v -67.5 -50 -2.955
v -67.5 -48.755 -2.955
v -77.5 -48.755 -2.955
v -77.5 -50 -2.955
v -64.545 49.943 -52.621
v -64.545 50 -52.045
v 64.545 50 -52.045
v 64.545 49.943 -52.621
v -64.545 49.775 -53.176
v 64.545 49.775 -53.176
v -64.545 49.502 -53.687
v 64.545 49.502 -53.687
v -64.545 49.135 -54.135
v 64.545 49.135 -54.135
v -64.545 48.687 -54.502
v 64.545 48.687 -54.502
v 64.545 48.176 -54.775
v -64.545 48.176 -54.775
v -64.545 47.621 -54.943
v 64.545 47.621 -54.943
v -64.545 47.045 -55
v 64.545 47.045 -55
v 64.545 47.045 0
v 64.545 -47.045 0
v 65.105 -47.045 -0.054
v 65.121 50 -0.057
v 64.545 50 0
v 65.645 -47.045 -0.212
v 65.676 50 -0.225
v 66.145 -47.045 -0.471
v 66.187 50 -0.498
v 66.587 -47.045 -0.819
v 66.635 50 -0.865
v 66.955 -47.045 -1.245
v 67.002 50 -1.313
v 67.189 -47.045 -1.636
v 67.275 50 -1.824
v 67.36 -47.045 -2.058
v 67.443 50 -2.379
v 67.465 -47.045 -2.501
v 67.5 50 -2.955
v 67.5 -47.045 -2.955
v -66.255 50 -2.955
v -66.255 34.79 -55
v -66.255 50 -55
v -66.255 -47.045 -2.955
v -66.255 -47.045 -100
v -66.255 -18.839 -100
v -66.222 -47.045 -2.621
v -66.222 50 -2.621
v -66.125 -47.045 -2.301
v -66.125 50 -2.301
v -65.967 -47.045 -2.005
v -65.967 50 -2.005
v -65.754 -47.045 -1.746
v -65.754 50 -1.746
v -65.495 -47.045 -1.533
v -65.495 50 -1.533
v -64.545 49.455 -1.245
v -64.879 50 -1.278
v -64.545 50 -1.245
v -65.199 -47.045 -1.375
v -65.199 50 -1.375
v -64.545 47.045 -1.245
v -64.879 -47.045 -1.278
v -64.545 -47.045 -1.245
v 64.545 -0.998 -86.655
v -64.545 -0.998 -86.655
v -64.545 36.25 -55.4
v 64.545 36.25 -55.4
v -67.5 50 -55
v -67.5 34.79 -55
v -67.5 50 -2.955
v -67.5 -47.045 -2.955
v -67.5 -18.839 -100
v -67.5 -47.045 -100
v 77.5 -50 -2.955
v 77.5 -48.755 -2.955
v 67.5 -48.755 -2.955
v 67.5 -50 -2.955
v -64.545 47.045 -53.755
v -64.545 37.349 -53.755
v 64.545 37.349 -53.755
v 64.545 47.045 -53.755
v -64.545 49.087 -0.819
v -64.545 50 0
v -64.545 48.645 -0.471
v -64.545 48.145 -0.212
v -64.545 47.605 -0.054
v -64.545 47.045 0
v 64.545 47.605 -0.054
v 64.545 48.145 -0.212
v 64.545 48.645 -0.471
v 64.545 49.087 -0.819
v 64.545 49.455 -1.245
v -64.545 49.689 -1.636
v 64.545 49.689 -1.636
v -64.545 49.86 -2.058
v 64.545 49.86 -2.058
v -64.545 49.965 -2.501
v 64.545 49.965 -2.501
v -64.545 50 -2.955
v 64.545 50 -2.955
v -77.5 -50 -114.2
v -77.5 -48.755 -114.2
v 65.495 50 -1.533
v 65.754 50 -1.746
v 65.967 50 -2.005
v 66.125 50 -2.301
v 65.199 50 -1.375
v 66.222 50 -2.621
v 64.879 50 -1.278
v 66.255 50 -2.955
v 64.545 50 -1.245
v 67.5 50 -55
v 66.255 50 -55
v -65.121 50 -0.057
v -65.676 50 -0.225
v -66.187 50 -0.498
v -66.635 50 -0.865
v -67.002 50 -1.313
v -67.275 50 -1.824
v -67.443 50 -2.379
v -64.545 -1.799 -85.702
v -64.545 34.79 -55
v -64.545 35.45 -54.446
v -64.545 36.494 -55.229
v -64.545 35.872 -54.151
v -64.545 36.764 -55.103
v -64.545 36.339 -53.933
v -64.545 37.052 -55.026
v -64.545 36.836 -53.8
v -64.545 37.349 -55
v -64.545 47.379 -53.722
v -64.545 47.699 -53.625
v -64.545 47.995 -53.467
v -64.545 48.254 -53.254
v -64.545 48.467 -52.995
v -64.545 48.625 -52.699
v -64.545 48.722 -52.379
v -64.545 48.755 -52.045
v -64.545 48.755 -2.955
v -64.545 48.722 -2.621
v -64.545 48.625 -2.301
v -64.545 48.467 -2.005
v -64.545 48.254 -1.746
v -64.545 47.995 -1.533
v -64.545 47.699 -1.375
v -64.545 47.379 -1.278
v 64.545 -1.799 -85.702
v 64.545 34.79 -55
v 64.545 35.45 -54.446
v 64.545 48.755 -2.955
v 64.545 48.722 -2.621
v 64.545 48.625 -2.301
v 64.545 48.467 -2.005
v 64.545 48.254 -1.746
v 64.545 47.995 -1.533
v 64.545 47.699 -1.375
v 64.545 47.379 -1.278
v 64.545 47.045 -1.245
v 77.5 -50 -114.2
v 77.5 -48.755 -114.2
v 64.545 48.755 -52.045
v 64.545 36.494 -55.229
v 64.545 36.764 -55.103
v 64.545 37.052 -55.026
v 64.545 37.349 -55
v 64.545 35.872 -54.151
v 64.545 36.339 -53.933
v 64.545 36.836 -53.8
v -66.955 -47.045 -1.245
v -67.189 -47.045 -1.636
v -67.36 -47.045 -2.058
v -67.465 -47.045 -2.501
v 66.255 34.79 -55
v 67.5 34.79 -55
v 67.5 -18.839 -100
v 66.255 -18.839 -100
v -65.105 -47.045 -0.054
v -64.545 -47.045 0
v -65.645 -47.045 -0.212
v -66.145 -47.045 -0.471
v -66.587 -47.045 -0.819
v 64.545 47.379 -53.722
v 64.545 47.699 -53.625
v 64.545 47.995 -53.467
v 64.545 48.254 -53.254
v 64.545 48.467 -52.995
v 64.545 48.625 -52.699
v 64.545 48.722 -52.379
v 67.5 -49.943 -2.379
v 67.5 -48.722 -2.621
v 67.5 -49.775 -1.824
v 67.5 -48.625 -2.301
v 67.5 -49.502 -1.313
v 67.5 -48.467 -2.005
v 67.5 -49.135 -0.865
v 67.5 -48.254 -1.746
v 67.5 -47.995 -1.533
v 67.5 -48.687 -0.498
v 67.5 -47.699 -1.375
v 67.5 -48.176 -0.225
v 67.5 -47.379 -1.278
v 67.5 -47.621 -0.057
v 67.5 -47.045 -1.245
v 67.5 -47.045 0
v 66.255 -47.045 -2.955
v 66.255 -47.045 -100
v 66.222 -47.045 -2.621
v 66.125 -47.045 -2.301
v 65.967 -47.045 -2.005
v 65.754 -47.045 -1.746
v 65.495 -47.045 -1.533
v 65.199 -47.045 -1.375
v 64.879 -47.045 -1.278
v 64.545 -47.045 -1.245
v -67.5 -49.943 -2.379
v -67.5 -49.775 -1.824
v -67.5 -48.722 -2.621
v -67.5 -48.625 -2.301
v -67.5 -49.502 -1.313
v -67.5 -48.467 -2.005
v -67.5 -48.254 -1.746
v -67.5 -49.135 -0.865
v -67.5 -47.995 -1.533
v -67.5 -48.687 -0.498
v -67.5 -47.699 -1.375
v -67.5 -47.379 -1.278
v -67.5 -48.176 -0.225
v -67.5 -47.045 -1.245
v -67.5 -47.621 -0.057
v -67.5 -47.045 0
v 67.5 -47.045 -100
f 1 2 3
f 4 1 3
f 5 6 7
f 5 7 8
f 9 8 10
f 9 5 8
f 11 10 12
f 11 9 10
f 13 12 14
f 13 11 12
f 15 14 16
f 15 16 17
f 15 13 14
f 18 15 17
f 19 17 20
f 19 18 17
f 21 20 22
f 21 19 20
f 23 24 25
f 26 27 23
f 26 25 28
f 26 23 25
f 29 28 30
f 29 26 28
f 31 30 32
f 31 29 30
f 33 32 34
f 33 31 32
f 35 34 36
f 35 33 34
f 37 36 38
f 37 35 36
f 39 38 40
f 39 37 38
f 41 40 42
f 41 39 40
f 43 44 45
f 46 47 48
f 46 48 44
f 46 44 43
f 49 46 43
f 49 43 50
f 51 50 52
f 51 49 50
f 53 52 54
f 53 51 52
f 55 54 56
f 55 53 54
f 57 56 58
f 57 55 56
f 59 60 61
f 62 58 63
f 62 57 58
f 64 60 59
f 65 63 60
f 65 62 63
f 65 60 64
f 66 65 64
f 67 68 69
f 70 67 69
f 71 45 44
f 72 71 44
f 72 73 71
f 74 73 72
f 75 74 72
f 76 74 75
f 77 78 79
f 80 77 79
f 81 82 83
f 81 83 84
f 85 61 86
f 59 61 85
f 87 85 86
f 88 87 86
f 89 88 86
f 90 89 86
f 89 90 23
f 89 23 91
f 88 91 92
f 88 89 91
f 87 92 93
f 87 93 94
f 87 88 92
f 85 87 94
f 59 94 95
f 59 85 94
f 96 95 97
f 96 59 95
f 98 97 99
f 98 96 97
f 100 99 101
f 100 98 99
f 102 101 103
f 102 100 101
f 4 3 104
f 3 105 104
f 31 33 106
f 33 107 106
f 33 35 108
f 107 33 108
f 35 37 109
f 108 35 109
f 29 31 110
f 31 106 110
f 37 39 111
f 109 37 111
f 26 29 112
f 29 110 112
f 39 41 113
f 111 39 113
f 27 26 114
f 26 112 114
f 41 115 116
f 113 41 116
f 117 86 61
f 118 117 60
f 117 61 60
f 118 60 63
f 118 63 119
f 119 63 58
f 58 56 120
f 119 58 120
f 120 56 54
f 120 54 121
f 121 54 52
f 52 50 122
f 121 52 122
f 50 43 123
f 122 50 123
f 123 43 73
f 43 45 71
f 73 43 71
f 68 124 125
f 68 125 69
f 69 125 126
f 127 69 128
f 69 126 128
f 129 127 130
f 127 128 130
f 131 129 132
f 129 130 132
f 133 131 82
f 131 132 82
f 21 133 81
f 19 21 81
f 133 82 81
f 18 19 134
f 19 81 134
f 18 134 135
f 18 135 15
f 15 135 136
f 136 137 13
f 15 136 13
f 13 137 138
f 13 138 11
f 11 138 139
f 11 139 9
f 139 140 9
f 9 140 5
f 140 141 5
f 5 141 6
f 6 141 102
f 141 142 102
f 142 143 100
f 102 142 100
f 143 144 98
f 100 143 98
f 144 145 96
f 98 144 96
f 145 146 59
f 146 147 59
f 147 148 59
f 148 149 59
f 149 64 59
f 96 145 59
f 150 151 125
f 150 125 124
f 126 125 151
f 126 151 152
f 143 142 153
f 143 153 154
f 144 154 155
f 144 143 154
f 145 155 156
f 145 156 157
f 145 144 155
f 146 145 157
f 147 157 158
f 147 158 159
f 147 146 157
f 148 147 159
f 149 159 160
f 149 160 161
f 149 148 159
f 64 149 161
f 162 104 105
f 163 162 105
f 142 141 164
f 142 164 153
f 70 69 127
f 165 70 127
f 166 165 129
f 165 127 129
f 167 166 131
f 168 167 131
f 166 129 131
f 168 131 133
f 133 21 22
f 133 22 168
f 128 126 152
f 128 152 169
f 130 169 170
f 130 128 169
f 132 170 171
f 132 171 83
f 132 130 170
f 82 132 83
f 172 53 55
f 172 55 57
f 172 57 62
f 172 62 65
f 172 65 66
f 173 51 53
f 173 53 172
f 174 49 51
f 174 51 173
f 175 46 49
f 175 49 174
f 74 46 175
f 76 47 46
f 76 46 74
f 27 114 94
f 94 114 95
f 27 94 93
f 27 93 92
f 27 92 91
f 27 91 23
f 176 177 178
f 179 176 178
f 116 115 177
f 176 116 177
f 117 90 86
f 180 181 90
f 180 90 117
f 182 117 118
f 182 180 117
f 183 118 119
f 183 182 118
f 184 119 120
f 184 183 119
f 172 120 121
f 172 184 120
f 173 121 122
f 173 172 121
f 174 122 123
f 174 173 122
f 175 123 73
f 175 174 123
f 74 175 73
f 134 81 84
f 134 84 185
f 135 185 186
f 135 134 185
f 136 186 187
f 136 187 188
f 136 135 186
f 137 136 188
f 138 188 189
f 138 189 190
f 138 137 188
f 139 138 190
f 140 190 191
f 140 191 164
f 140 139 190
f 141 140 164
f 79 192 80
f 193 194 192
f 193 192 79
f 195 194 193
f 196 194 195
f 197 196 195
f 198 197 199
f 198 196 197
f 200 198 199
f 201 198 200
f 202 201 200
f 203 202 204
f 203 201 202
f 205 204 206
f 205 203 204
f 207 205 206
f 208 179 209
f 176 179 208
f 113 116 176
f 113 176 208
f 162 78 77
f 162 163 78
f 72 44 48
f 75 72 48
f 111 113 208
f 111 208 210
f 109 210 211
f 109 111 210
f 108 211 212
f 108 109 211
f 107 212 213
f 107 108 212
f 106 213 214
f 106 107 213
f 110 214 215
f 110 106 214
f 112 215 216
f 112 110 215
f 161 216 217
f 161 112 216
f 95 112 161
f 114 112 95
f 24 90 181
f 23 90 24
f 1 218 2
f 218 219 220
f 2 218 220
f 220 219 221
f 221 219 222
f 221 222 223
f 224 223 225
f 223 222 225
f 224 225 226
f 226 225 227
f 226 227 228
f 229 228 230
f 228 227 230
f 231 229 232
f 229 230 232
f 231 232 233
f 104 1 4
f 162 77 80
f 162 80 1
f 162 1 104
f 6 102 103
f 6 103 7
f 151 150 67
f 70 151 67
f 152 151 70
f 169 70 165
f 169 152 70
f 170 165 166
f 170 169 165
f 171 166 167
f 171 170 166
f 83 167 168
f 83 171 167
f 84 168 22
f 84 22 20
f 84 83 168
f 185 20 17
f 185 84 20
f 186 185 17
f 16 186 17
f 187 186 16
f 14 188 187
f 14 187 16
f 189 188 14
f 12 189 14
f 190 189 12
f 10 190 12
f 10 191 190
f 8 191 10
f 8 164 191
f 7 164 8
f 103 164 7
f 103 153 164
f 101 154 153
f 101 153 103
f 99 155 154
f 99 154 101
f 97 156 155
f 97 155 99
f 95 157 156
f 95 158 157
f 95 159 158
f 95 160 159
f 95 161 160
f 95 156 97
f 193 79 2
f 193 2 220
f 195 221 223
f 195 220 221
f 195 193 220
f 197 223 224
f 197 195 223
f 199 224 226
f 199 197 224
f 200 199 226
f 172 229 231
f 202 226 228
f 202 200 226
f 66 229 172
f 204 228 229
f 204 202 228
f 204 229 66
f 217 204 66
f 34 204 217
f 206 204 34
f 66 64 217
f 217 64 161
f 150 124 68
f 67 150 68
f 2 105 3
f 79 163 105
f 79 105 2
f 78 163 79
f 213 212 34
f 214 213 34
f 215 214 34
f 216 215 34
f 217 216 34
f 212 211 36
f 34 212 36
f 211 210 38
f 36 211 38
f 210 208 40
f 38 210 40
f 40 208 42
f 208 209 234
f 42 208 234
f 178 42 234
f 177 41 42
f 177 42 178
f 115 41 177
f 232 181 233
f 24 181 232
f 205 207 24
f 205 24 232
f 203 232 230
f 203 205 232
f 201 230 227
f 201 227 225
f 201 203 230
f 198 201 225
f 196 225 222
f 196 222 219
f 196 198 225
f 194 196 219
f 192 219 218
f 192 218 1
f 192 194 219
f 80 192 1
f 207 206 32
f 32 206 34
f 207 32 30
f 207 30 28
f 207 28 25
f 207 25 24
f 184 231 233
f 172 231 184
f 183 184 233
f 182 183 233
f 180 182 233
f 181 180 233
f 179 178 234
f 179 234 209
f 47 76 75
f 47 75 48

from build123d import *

# Parameters (mm, degrees)
SKETCH1_W                      = 155
SKETCH1_H                      = 100
BASE_FLANGE2_DEPTH             = 1.245
EDGE_FLANGE3_STRIP_W           = 8.4
EDGE_FLANGE3_STRIP_H           = 1.245
EDGE_FLANGE3_STRIP_CUT_DEPTH   = 155
EDGE_FLANGE3_DEPTH             = 155
CUT_EXTRUDE2_START             = -1.245
CUT_EXTRUDE2_OUTLINE_W         = 10
CUT_EXTRUDE2_OUTLINE_H         = 102
CUT_EXTRUDE2_DEPTH             = 2.955
EDGE_FLANGE4_STRIP_W           = 8.4
EDGE_FLANGE4_STRIP_H           = 1.245
EDGE_FLANGE4_STRIP_CUT_DEPTH   = 97.045
EDGE_FLANGE4_STRIP_2_W         = 8.4
EDGE_FLANGE4_STRIP_2_H         = 1.245
EDGE_FLANGE4_STRIP_CUT_2_DEPTH = 97.045
EDGE_FLANGE4_DEPTH             = 97.045
EDGE_FLANGE4_BEND_DEPTH        = 97.045
EDGE_FLANGE5_STRIP_W           = 8.4
EDGE_FLANGE5_STRIP_H           = 1.245
EDGE_FLANGE5_STRIP_CUT_DEPTH   = 129.09
EDGE_FLANGE5_DEPTH             = 129.09
CUT_EXTRUDE3_DEPTH             = 192.224057064
EDGE_FLANGE6_STRIP_W           = 8.4
EDGE_FLANGE6_STRIP_H           = 1.245
EDGE_FLANGE6_STRIP_CUT_DEPTH   = 129.09
EDGE_FLANGE6_DEPTH             = 129.09
EDGE_FLANGE7_START             = -64.545
EDGE_FLANGE7_DEPTH             = 129.09
EDGE_FLANGE7_2_DEPTH           = 129.09


# Read off the part's stored shape, not the designer's step: Cut-Extrude2, Edge-Flange7
# Sheet-metal steps are written as plain solids
with BuildPart() as part:
    # Sketch1 → Base-Flange2 (new body)
    with BuildSketch(Plane.XY):
        Rectangle(SKETCH1_W, SKETCH1_H)
    extrude(amount=-BASE_FLANGE2_DEPTH)

    # Edge-Flange3 strip (across the edge) → Edge-Flange3 strip cut (cut)
    with BuildSketch(Plane(origin=(77.5, -50, -1.245), x_dir=(0, 1, 0), z_dir=(-1, 0, 0))):
        with Locations((-1.245, -0.6225)):
            Rectangle(EDGE_FLANGE3_STRIP_W, EDGE_FLANGE3_STRIP_H)
    extrude(amount=EDGE_FLANGE3_STRIP_CUT_DEPTH, mode=Mode.SUBTRACT)

    # Edge-Flange3 section (across the edge) → Edge-Flange3 (add)
    with BuildSketch(Plane(origin=(77.5, -50, -1.245), x_dir=(0, 1, 0), z_dir=(-1, 0, 0))):
        with BuildLine():
            Line((0, 1.71), (0, 112.955))
            Line((0, 112.955), (1.245, 112.955))
            Line((1.245, 112.955), (1.245, 1.71))
            ThreePointArc((1.245, 1.71), (1.745847404, 0.500847404), (2.955, 0))
            Line((2.955, 0), (2.955, -1.245))
            ThreePointArc((2.955, -1.245), (0.865499462, -0.379500538), (0, 1.71))
        make_face()
    extrude(amount=EDGE_FLANGE3_DEPTH)

    # Cut-Extrude2 outline → Cut-Extrude2 (cut)
    with BuildSketch(Plane(origin=(0, 0, -1.245), x_dir=(-1, 0, 0), z_dir=(0, 0, -1)).offset(CUT_EXTRUDE2_START)):
        with Locations((72.5, 0)):
            Rectangle(CUT_EXTRUDE2_OUTLINE_W, CUT_EXTRUDE2_OUTLINE_H)
        with Locations((-72.5, 0)):
            Rectangle(CUT_EXTRUDE2_OUTLINE_W, CUT_EXTRUDE2_OUTLINE_H)
    extrude(amount=CUT_EXTRUDE2_DEPTH, mode=Mode.SUBTRACT)

    # Edge-Flange4 strip (across the edge) → Edge-Flange4 strip cut (cut)
    with BuildSketch(Plane(origin=(67.5, 50, -1.245), x_dir=(-1, 0, 0), z_dir=(0, -1, 0))):
        with Locations((-1.245, -0.6225)):
            Rectangle(EDGE_FLANGE4_STRIP_W, EDGE_FLANGE4_STRIP_H)
    extrude(amount=EDGE_FLANGE4_STRIP_CUT_DEPTH, mode=Mode.SUBTRACT)

    # Edge-Flange4 strip 2 (across the edge) → Edge-Flange4 strip cut 2 (cut)
    with BuildSketch(Plane(origin=(-67.5, -47.045, -1.245), x_dir=(1, 0, 0), z_dir=(0, 1, 0))):
        with Locations((-1.245, -0.6225)):
            Rectangle(EDGE_FLANGE4_STRIP_2_W, EDGE_FLANGE4_STRIP_2_H)
    extrude(amount=EDGE_FLANGE4_STRIP_CUT_2_DEPTH, mode=Mode.SUBTRACT)

    # Edge-Flange4 section (across the edge) → Edge-Flange4 (add)
    with BuildSketch(Plane(origin=(67.5, 50, -1.245), x_dir=(-1, 0, 0), z_dir=(0, -1, 0))):
        with BuildLine():
            Line((0, 1.71), (0, 98.755))
            Line((0, 98.755), (1.245, 98.755))
            Line((1.245, 98.755), (1.245, 1.71))
            ThreePointArc((1.245, 1.71), (1.745847404, 0.500847404), (2.955, 0))
            Line((2.955, 0), (2.955, -1.245))
            ThreePointArc((2.955, -1.245), (0.865499462, -0.379500538), (0, 1.71))
        make_face()
    extrude(amount=EDGE_FLANGE4_DEPTH)

    # Edge-Flange4 section 2 (across the edge) → Edge-Flange4 bend (add)
    with BuildSketch(Plane(origin=(-67.5, -47.045, -1.245), x_dir=(1, 0, 0), z_dir=(0, 1, 0))):
        with BuildLine():
            Line((0, 1.71), (0, 98.755))
            Line((0, 98.755), (1.245, 98.755))
            Line((1.245, 98.755), (1.245, 1.71))
            ThreePointArc((1.245, 1.71), (1.745847404, 0.500847404), (2.955, 0))
            Line((2.955, 0), (2.955, -1.245))
            ThreePointArc((2.955, -1.245), (0.865499462, -0.379500538), (0, 1.71))
        make_face()
    extrude(amount=EDGE_FLANGE4_BEND_DEPTH)

    # Edge-Flange5 strip (across the edge) → Edge-Flange5 strip cut (cut)
    with BuildSketch(Plane(origin=(-64.545, 50, -1.245), x_dir=(0, -1, 0), z_dir=(1, 0, 0))):
        with Locations((-1.245, -0.6225)):
            Rectangle(EDGE_FLANGE5_STRIP_W, EDGE_FLANGE5_STRIP_H)
    extrude(amount=EDGE_FLANGE5_STRIP_CUT_DEPTH, mode=Mode.SUBTRACT)

    # Edge-Flange5 section (across the edge) → Edge-Flange5 (add)
    with BuildSketch(Plane(origin=(-64.545, 50, -1.245), x_dir=(0, -1, 0), z_dir=(1, 0, 0))):
        with BuildLine():
            Line((0, 1.71), (0, 53.755))
            Line((0, 53.755), (1.245, 53.755))
            Line((1.245, 53.755), (1.245, 1.71))
            ThreePointArc((1.245, 1.71), (1.745847404, 0.500847404), (2.955, 0))
            Line((2.955, 0), (2.955, -1.245))
            ThreePointArc((2.955, -1.245), (0.865499462, -0.379500538), (0, 1.71))
        make_face()
    extrude(amount=EDGE_FLANGE5_DEPTH)

    # Sketch26 → Cut-Extrude3 (cut, through all)
    with BuildSketch(Plane(origin=(67.5, 0, 0), x_dir=(0, 0, -1), z_dir=(1, 0, 0))):
        Polygon((55, 50), (55, 34.789940387), (100, -18.83897128), (100, 50), align=None)
    extrude(amount=-CUT_EXTRUDE3_DEPTH, mode=Mode.SUBTRACT)

    # Edge-Flange6 strip (across the edge) → Edge-Flange6 strip cut (cut)
    with BuildSketch(Plane(origin=(-64.545, 48.755, -55), x_dir=(0, 0, 1), z_dir=(1, 0, 0))):
        with Locations((-1.245, -0.6225)):
            Rectangle(EDGE_FLANGE6_STRIP_W, EDGE_FLANGE6_STRIP_H)
    extrude(amount=EDGE_FLANGE6_STRIP_CUT_DEPTH, mode=Mode.SUBTRACT)

    # Edge-Flange6 section (across the edge) → Edge-Flange6 (add)
    with BuildSketch(Plane(origin=(-64.545, 48.755, -55), x_dir=(0, 0, 1), z_dir=(1, 0, 0))):
        with BuildLine():
            Line((0, 1.71), (0, 13.965059613))
            Line((0, 13.965059613), (1.245, 13.965059613))
            Line((1.245, 13.965059613), (1.245, 1.71))
            ThreePointArc((1.245, 1.71), (1.745847404, 0.500847404), (2.955, 0))
            Line((2.955, 0), (2.955, -1.245))
            ThreePointArc((2.955, -1.245), (0.865499462, -0.379500538), (0, 1.71))
        make_face()
    extrude(amount=EDGE_FLANGE6_DEPTH)

    # Edge-Flange7 outline → Edge-Flange7 (cut)
    with BuildSketch(Plane.YZ.offset(EDGE_FLANGE7_START)):
        with BuildLine():
            Line((34.789940387, -55), (35.449768265, -54.446338671))
            ThreePointArc((35.449768265, -54.446338671), (36.338536128, -53.933208306), (37.349205652, -53.755))
            Line((37.349205652, -53.755), (34.789940387, -53.755))
            Line((34.789940387, -53.755), (34.789940387, -55))
        make_face()
    extrude(amount=EDGE_FLANGE7_DEPTH, mode=Mode.SUBTRACT)

    # Edge-Flange7 2 outline → Edge-Flange7 2 (add)
    with BuildSketch(Plane.YZ.offset(EDGE_FLANGE7_START)):
        with BuildLine():
            Line((37.349205652, -55), (34.789940387, -55))
            Line((34.789940387, -55), (-1.798735213, -85.701544201))
            Line((-1.798735213, -85.701544201), (-0.998464639, -86.655269533))
            Line((-0.998464639, -86.655269533), (36.250038839, -55.400064002))
            ThreePointArc((36.250038839, -55.400064002), (36.764351207, -55.103125618), (37.349205652, -55))
        make_face()
    extrude(amount=EDGE_FLANGE7_2_DEPTH)


solid = part.part
